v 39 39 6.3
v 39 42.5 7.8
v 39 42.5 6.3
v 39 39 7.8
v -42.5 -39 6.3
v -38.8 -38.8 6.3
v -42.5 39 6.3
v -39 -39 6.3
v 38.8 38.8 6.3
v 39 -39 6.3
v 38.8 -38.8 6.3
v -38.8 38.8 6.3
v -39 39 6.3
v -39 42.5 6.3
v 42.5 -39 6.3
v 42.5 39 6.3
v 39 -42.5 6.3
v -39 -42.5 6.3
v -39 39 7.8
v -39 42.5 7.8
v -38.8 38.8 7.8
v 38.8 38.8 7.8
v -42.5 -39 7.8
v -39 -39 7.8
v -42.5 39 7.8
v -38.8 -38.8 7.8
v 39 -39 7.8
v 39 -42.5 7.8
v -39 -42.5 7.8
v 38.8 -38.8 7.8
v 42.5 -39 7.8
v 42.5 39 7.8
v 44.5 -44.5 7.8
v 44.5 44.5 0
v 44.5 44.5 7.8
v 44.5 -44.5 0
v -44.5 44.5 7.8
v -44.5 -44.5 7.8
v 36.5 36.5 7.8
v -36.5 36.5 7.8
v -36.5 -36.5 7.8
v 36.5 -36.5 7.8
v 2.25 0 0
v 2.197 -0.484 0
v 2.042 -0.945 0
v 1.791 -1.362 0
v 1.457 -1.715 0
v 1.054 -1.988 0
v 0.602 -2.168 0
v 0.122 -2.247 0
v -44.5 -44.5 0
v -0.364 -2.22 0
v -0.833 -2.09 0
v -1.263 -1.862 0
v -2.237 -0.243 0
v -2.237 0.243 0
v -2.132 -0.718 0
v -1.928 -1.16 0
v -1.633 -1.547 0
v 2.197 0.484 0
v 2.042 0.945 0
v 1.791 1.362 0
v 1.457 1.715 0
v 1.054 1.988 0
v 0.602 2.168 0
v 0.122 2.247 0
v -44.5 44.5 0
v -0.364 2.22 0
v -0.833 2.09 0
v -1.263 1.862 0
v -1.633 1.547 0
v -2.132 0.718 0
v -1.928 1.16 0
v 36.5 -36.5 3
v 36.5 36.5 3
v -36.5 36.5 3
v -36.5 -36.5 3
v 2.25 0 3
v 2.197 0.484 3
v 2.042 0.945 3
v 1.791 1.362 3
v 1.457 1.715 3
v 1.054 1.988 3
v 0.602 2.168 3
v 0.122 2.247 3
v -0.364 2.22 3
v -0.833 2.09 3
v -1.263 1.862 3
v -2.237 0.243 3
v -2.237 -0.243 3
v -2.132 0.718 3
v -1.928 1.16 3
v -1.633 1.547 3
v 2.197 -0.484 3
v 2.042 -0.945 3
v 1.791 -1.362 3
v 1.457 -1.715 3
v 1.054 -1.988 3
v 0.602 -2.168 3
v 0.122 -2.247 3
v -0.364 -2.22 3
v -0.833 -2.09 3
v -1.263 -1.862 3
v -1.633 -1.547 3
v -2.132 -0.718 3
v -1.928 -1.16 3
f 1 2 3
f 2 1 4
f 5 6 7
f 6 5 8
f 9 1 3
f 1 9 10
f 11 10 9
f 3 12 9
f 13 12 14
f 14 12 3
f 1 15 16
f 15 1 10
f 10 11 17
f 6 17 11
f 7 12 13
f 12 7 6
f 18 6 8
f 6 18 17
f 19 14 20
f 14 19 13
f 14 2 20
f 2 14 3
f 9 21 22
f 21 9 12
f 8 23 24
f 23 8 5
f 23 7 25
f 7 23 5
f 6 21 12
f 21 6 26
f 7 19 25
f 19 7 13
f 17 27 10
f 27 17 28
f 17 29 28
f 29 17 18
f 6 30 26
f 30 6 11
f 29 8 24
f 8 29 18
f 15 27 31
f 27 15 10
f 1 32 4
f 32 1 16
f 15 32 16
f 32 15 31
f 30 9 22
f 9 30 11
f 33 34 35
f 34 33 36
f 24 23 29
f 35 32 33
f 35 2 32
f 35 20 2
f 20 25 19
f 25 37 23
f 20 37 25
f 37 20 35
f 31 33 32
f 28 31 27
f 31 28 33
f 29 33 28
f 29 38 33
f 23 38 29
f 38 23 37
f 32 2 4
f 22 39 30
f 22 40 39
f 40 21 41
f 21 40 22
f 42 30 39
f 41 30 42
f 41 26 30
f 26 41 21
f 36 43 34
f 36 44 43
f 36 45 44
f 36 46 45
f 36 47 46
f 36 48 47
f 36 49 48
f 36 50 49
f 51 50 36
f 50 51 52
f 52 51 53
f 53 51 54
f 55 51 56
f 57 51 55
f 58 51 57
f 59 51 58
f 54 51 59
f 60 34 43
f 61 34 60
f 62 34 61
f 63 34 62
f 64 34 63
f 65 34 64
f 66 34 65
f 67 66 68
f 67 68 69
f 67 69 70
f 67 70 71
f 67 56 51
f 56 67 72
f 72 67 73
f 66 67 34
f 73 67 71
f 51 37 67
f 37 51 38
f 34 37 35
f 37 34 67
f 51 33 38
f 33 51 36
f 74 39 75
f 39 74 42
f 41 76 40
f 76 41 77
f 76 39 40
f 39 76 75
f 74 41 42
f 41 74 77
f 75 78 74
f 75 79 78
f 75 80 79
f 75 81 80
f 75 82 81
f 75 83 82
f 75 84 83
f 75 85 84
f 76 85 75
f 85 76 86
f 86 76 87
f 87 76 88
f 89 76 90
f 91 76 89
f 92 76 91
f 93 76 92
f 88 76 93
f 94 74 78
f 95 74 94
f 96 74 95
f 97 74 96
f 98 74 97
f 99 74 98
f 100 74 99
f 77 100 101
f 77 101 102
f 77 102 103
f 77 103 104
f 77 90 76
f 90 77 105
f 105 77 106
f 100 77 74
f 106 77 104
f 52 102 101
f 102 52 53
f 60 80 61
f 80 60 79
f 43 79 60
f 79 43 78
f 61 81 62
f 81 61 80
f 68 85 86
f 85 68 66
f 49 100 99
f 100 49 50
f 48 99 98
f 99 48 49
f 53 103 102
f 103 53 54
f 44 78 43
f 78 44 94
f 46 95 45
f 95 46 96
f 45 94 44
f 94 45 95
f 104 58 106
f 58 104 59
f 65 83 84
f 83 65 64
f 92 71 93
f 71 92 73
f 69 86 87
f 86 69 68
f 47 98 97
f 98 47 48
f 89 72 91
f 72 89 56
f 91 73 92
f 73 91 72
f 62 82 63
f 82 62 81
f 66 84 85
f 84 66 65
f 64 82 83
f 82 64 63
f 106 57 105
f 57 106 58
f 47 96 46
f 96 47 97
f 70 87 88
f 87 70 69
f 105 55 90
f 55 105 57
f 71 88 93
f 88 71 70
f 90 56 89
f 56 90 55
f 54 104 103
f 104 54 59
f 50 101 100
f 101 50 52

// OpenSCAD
$fa=0.5; // default minimum facet angle is now 0.5
$fs=0.5; // default minimum facet size is now 0.5 mm

base_ext = 89;
base_height = 7.8;
base_floor = 3;
base_border = 8;
base_int = base_ext - 2 * base_border;
slit_width = 78;
slit_border = 2;   // Distance between exterior or box to start of slit;
slit_height = 3.7;
slit_depth = 1.5;

center_hole = 4.5;

difference() {
    union() {
        difference() {
            union() {
                // Main block
                translate([0, 0, base_height/2]) cube([base_ext, base_ext, base_height], center=true);
            }
            // center
            translate([0, 0, base_height/2]) cube([base_int, base_int, base_height+2], center=true);
            // slits
            for (angle = [0:90:359]) {
                rotate([0, 0, angle]) translate([0, base_ext/2-slit_height/2-slit_border, base_height-slit_depth/2+0.5]) cube([slit_width, slit_height, slit_depth+1], center=true);
            }
            
        }
        // floor
        translate([0, 0, base_floor/2]) cube([base_ext, base_ext, base_floor], center=true);
    }
    // center hole
    translate([0, 0, -base_height/2]) cylinder(d = center_hole, h = base_border + 2);
}
